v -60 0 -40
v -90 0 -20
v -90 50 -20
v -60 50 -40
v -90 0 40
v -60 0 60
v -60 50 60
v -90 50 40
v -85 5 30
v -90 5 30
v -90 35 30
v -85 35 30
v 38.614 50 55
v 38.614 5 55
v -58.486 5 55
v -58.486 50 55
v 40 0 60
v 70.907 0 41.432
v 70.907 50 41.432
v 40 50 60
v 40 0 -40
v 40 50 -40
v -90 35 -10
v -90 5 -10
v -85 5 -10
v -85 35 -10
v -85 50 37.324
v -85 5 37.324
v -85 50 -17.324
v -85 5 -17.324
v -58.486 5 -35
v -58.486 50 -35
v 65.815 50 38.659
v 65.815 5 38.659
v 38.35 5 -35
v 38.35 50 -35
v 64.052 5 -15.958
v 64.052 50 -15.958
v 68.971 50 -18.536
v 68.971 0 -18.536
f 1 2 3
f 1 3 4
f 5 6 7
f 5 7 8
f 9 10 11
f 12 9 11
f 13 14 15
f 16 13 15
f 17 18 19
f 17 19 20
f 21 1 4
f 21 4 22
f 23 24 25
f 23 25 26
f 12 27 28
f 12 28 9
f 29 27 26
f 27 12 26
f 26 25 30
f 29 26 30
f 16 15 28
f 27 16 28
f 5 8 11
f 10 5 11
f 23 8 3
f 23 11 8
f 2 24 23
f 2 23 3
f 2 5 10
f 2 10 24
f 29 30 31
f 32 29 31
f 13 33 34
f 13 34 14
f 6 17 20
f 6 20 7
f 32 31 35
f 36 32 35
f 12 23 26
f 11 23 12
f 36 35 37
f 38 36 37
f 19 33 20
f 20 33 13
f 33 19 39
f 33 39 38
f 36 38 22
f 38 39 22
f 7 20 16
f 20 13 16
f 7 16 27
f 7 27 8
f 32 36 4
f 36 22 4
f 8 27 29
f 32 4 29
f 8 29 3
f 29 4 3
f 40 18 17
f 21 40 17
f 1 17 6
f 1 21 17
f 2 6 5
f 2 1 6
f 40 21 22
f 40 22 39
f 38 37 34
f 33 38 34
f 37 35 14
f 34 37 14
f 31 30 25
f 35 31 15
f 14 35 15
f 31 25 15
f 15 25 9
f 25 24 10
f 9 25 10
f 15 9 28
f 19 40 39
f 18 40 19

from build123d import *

# Parameters (mm, degrees)
DODANIE_WYCI_GNI_CIE2_DEPTH = 50
SKORUPA2_T                  = -5
WYTNIJ_WYCI_GNI_CIE1_REACH  = 162.907
SZKIC2_W                    = 40
SZKIC2_H                    = 30


with BuildPart() as part:
    # Szkic1 → Dodanie-wyciągnięcie2 (new body)
    with BuildSketch(Plane(origin=(0, 0, 0), x_dir=(1, 0, 0), z_dir=(0, 1, 0))):
        Polygon((-60, 40), (40, 40), (68.970961298, 18.536463444), (70.906962059, -41.432294264), (40, -60), (-60, -60), (-90, -40), (-90, 20), align=None)
    extrude(amount=DODANIE_WYCI_GNI_CIE2_DEPTH)

    # Skorupa2
    skorupa2_openings = [part.faces().sort_by_distance(p)[0] for p in [
        (-10.01525958, 50, 10.361978853),
    ]]
    offset(amount=SKORUPA2_T, openings=skorupa2_openings, kind=Kind.INTERSECTION)

    # Szkic2 → Wytnij-wyciągnięcie1 (cut, up to next)
    with BuildSketch(Plane.ZY.offset(90), mode=Mode.PRIVATE) as wytnij_wyci_gni_cie1_sk1:
        with Locations((10, 20)):
            Rectangle(SZKIC2_W, SZKIC2_H)
    wytnij_wyci_gni_cie1_tool1 = extrude(wytnij_wyci_gni_cie1_sk1.sketch, amount=-WYTNIJ_WYCI_GNI_CIE1_REACH, mode=Mode.PRIVATE) & part.part
    add(wytnij_wyci_gni_cie1_tool1.solids().sort_by_distance((-90, 20, 10))[0], mode=Mode.SUBTRACT)


solid = part.part
